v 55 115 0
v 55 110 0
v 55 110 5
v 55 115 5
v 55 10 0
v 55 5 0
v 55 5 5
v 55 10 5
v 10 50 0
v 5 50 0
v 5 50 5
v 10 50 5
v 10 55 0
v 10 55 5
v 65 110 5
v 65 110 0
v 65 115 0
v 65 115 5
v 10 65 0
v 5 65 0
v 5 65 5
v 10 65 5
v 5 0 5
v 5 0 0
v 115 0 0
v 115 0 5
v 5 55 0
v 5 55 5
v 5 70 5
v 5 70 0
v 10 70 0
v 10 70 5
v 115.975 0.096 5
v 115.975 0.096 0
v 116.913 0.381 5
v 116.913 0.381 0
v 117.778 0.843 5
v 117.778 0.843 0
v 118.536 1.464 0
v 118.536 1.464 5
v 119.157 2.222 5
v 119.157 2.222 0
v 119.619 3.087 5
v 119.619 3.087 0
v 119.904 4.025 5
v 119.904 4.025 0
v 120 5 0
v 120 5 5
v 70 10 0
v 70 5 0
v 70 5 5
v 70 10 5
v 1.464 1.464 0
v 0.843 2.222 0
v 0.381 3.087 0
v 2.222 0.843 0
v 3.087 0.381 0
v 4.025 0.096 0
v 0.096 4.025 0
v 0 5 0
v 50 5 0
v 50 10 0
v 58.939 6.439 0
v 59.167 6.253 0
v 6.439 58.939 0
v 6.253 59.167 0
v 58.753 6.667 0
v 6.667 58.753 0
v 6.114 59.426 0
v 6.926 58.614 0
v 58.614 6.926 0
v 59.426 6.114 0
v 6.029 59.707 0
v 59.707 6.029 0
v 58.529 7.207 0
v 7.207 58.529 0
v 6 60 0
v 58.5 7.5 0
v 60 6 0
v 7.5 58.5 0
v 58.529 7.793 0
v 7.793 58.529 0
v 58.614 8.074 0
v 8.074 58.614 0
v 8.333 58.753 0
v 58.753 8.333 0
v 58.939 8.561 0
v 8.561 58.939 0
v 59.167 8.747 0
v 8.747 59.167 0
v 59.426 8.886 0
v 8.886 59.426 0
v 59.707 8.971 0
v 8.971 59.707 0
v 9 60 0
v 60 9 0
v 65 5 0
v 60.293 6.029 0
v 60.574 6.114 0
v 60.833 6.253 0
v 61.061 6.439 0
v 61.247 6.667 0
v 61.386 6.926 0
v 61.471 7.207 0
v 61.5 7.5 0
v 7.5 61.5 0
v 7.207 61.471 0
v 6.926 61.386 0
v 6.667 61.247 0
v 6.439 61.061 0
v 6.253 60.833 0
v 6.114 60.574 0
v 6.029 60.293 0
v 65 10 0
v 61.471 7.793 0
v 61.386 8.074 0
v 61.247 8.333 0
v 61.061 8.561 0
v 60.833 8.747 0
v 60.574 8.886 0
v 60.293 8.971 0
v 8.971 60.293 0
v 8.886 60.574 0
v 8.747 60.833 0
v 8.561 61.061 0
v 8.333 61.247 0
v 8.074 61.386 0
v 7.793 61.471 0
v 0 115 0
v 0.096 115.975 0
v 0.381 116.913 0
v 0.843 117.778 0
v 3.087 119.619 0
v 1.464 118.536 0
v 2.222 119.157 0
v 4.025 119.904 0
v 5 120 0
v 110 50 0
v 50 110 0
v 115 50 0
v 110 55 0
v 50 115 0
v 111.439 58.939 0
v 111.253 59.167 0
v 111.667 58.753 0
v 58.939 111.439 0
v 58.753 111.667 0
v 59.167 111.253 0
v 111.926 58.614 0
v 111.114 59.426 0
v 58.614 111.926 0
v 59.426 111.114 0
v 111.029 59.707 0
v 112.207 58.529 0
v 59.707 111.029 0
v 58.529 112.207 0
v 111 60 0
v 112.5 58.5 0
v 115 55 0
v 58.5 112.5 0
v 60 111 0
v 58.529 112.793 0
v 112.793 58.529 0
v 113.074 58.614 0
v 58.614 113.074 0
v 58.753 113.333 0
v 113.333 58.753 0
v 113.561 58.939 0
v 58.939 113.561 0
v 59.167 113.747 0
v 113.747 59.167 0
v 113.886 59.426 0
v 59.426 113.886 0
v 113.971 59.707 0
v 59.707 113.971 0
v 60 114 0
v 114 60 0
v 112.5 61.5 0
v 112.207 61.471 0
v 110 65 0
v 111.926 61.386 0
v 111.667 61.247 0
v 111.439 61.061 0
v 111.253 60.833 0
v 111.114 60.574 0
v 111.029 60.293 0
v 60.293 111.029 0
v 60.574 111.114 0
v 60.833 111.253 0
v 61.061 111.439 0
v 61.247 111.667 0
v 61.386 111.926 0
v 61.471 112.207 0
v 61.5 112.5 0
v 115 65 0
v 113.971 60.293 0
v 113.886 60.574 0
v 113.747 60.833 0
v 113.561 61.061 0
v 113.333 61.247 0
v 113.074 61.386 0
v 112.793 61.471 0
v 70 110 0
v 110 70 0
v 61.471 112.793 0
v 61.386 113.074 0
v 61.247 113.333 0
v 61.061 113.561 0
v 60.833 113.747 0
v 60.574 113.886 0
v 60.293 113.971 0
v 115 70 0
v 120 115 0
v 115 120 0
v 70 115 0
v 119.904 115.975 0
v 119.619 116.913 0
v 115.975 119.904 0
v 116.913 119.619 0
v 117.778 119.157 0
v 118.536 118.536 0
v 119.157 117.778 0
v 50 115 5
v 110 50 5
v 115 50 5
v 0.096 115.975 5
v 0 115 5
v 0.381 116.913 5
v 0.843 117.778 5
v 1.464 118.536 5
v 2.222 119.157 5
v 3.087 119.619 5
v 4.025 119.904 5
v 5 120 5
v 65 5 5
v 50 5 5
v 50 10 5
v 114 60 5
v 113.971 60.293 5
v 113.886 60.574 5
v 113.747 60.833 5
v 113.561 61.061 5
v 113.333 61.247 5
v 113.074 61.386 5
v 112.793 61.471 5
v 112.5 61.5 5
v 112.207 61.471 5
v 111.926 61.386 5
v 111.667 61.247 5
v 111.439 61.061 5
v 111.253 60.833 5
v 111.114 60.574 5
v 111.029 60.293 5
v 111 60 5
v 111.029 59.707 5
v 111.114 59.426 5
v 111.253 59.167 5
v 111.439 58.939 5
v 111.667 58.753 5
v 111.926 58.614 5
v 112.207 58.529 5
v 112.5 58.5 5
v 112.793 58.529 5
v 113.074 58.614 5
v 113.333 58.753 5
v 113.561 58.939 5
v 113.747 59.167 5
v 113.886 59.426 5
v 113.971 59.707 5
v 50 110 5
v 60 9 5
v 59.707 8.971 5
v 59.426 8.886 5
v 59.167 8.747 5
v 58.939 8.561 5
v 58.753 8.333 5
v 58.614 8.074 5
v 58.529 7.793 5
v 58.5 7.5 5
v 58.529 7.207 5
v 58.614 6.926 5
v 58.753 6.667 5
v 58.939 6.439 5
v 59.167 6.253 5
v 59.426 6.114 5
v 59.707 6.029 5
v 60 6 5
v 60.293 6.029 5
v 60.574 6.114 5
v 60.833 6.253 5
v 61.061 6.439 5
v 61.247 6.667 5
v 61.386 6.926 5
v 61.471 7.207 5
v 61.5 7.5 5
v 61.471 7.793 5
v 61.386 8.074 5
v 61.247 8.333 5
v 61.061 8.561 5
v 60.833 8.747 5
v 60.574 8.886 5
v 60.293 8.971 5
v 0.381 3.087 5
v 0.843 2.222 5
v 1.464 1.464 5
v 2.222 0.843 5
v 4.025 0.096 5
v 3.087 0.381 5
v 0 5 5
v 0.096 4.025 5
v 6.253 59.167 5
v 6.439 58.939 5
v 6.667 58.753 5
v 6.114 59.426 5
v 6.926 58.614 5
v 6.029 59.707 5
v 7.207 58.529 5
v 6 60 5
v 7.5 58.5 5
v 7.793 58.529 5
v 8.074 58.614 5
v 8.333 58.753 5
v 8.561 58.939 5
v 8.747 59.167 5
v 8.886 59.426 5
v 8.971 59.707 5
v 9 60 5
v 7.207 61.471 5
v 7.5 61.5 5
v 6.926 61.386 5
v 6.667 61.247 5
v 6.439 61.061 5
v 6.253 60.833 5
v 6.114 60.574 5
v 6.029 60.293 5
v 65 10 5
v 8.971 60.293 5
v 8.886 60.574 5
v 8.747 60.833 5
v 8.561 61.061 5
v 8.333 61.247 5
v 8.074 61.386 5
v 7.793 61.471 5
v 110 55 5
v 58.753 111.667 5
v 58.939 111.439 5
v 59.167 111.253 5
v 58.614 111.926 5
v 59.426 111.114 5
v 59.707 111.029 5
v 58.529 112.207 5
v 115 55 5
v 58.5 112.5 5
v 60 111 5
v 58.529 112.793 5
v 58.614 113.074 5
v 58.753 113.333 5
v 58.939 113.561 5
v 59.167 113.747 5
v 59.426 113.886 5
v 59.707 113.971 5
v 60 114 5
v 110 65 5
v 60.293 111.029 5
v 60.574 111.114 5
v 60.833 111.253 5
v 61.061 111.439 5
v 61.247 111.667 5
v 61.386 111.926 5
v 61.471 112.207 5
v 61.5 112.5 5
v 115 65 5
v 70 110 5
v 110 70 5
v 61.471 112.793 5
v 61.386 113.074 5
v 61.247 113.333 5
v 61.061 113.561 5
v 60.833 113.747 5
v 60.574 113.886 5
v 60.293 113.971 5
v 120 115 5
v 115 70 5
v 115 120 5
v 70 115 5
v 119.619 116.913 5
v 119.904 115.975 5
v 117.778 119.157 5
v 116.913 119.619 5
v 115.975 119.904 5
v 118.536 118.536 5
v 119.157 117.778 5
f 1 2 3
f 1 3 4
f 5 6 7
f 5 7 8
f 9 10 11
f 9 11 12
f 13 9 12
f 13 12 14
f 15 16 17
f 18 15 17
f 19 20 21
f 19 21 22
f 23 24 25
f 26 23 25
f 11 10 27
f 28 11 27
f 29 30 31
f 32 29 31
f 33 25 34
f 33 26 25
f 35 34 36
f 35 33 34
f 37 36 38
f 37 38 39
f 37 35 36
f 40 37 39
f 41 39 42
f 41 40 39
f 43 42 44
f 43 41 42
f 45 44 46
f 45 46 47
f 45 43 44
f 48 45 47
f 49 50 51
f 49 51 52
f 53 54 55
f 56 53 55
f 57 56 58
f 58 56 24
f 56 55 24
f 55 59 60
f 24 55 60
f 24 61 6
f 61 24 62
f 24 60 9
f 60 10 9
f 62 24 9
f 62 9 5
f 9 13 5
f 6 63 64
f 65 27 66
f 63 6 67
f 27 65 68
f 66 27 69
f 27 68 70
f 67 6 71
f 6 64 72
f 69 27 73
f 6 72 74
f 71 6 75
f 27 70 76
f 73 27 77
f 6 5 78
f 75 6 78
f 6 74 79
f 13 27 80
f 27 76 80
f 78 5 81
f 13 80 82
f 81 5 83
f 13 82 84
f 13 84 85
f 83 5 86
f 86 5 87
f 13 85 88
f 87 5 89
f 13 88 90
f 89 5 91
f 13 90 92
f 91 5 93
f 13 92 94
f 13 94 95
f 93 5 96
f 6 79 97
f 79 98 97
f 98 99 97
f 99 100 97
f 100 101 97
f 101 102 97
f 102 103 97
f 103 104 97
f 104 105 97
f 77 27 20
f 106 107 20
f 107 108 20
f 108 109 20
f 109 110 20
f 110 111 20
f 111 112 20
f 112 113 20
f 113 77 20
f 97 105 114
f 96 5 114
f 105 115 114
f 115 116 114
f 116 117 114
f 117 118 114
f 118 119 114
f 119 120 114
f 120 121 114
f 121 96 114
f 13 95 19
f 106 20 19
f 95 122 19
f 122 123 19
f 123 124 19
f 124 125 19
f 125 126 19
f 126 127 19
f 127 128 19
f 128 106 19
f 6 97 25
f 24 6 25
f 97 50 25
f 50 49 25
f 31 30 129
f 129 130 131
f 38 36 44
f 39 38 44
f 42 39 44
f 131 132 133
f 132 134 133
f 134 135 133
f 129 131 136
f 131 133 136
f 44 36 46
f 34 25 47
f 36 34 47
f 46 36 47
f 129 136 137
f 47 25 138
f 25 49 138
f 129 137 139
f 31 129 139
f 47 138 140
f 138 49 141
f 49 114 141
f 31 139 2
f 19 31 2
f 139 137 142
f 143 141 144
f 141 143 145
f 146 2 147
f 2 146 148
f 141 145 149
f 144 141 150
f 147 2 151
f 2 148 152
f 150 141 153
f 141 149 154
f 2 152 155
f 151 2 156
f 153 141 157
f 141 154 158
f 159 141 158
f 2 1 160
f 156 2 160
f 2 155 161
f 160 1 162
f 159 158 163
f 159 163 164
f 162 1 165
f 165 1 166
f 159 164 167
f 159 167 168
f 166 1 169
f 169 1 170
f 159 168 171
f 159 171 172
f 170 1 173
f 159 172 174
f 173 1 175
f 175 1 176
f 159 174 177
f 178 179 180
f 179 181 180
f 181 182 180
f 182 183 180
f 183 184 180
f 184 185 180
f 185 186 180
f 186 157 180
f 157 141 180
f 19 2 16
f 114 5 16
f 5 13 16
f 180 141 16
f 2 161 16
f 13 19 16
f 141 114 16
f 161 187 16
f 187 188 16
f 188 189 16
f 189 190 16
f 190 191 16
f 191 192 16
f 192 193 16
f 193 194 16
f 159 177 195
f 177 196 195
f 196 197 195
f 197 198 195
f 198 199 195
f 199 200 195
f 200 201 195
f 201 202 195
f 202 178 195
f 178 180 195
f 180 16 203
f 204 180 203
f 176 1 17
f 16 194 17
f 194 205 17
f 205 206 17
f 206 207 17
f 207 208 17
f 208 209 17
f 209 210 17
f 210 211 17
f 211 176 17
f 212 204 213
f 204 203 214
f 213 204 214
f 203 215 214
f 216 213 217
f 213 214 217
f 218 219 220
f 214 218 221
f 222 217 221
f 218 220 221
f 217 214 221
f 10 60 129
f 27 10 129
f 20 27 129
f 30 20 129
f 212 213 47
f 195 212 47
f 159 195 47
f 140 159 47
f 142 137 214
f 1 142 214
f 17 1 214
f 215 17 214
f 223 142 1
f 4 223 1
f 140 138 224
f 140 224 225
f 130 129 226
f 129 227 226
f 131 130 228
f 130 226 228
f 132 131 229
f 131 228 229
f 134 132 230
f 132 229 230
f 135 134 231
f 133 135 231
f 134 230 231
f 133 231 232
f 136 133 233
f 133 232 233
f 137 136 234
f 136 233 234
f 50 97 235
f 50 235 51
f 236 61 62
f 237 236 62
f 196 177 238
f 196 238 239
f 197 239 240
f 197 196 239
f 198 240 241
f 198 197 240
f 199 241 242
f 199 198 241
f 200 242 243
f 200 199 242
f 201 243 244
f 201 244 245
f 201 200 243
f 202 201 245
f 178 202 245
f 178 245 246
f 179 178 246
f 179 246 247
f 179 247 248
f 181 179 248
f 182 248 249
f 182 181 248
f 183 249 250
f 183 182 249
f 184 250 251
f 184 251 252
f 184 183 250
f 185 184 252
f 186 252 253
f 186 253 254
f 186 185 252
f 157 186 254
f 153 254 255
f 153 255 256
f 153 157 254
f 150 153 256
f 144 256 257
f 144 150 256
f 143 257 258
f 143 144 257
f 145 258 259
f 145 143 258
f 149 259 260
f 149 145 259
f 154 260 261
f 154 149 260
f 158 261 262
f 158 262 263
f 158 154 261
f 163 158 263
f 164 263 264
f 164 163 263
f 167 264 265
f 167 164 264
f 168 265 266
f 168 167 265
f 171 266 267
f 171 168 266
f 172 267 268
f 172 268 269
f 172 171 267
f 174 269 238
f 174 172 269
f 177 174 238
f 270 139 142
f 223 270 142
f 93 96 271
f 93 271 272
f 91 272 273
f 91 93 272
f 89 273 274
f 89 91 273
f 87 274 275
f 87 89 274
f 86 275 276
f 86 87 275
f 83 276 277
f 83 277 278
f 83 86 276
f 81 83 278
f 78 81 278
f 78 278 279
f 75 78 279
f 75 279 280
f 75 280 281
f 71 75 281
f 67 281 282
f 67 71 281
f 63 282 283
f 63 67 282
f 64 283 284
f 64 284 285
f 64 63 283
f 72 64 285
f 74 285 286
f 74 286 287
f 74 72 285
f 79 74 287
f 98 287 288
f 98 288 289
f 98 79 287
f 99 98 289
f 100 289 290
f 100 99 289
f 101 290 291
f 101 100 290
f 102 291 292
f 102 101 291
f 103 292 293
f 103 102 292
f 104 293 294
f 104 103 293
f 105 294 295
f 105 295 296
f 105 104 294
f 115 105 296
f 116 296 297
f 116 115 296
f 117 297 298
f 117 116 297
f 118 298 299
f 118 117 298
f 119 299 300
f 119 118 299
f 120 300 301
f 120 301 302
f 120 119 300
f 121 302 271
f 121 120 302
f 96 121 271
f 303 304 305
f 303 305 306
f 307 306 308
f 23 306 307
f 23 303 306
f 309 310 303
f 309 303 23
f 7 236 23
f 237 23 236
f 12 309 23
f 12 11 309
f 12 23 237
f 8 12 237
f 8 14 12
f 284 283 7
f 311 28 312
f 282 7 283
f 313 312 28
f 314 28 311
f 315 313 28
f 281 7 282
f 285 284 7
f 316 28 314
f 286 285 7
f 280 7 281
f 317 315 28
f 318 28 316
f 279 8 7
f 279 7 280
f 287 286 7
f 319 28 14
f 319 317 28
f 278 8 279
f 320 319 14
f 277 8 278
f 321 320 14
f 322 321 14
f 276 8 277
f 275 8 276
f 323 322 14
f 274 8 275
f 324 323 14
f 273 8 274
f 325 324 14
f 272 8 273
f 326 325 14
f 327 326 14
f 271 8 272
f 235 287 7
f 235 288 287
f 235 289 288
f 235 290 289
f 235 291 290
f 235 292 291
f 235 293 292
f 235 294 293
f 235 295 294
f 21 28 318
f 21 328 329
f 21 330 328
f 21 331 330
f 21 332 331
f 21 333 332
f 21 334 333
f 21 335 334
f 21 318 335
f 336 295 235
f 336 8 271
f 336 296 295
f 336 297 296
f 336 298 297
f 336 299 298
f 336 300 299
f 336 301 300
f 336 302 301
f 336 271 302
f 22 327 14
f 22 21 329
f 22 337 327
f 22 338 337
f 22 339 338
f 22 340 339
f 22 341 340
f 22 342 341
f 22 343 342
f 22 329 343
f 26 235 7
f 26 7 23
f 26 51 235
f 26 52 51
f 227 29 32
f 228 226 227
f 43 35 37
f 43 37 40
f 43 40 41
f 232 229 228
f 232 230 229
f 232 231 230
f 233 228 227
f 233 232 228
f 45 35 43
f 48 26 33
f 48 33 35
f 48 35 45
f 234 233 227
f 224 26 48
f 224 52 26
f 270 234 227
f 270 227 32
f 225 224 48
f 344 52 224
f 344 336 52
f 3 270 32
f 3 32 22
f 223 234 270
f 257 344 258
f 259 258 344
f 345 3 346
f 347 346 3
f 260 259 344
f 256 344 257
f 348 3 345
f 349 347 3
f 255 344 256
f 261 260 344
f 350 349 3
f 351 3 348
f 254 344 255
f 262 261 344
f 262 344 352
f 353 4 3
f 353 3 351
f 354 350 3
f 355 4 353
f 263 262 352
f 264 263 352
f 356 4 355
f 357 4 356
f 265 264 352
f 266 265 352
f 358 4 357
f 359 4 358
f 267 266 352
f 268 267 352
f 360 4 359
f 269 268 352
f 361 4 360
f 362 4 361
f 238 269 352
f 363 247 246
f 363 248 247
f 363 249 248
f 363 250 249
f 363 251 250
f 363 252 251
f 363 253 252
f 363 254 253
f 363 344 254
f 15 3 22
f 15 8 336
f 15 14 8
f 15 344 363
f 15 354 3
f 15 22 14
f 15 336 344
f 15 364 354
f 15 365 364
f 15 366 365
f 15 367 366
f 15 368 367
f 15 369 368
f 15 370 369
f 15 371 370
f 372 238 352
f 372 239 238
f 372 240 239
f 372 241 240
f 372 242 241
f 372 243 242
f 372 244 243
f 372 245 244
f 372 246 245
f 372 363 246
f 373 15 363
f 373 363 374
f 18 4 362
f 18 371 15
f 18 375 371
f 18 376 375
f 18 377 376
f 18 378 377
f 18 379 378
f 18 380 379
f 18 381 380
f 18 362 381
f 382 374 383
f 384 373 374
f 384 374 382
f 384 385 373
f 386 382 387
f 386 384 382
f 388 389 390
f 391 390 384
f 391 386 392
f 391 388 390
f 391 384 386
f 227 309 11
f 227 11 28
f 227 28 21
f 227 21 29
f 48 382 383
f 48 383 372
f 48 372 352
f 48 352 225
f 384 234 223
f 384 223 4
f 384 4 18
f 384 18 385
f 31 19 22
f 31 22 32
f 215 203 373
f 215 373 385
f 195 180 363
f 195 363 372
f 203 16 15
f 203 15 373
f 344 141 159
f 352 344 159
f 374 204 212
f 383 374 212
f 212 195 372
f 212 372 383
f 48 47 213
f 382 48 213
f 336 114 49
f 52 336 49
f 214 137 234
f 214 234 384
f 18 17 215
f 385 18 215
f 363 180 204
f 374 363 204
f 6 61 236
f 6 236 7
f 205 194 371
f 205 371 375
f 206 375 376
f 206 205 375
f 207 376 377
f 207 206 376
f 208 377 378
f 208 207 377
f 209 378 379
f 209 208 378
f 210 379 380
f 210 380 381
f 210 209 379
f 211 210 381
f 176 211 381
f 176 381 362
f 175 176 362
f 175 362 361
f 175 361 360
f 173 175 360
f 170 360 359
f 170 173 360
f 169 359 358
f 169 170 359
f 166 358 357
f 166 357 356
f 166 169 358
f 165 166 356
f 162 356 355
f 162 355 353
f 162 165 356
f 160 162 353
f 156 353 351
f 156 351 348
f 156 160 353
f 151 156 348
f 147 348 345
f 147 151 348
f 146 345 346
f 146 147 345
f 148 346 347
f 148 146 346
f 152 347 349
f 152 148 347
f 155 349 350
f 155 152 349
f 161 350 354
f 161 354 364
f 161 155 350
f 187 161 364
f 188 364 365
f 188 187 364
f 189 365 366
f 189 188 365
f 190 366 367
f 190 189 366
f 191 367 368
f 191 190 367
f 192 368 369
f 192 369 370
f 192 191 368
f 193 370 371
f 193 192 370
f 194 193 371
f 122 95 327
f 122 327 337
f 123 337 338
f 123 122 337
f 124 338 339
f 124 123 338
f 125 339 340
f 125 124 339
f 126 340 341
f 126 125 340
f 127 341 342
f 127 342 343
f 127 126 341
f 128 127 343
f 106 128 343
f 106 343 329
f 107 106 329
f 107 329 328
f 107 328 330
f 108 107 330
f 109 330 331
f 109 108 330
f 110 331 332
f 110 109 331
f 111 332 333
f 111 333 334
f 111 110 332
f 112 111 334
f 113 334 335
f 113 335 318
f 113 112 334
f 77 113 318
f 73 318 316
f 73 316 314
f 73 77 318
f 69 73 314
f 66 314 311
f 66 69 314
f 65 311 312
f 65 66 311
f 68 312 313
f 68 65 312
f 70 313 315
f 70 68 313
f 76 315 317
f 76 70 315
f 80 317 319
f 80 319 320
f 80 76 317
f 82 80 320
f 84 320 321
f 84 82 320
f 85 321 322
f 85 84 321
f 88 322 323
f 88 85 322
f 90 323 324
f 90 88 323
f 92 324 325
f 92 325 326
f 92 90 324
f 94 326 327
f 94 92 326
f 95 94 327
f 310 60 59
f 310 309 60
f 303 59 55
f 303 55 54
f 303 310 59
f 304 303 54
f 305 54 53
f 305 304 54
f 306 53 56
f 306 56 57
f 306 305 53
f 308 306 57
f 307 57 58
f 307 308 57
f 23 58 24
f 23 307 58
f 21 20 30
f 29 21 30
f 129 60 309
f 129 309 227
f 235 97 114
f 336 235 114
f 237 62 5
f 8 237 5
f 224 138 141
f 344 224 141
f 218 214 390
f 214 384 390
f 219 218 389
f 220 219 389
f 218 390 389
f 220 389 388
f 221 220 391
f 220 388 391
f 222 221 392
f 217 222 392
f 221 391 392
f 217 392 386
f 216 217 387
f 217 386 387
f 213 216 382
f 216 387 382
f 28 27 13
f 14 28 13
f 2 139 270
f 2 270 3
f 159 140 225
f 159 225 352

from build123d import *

# Parameters (mm, degrees)
SKETCH1_W           = 120
SKETCH1_H           = 120
SKETCH1_R           = 1.5
SKETCH1_W_2         = 5
SKETCH1_H_2         = 5
BOSS_EXTRUDE1_DEPTH = 5
FILLET1_R           = 5


with BuildPart() as part:
    # Sketch1 → Boss-Extrude1 (new body)
    with BuildSketch(Plane.XY):
        with Locations((60, 60)):
            Rectangle(SKETCH1_W, SKETCH1_H)
        with Locations((112.5, 60)):
            Circle(SKETCH1_R, mode=Mode.SUBTRACT)
        with Locations((7.5, 60)):
            Circle(SKETCH1_R, mode=Mode.SUBTRACT)
        with Locations((60, 112.5)):
            Circle(SKETCH1_R, mode=Mode.SUBTRACT)
        with Locations(Location((60, 7.5, 0), (0, 0, 90))):
            Circle(SKETCH1_R, mode=Mode.SUBTRACT)
        with Locations((112.5, 52.5)):
            Rectangle(SKETCH1_W_2, SKETCH1_H_2, mode=Mode.SUBTRACT)
        with Locations((112.5, 67.5)):
            Rectangle(SKETCH1_W_2, SKETCH1_H_2, mode=Mode.SUBTRACT)
        with Locations((7.5, 52.5)):
            Rectangle(SKETCH1_W_2, SKETCH1_H_2, mode=Mode.SUBTRACT)
        with Locations((7.5, 67.5)):
            Rectangle(SKETCH1_W_2, SKETCH1_H_2, mode=Mode.SUBTRACT)
        with Locations((67.5, 112.5)):
            Rectangle(SKETCH1_W_2, SKETCH1_H_2, mode=Mode.SUBTRACT)
        with Locations((52.5, 112.5)):
            Rectangle(SKETCH1_W_2, SKETCH1_H_2, mode=Mode.SUBTRACT)
        with Locations((67.5, 7.5)):
            Rectangle(SKETCH1_W_2, SKETCH1_H_2, mode=Mode.SUBTRACT)
        with Locations((52.5, 7.5)):
            Rectangle(SKETCH1_W_2, SKETCH1_H_2, mode=Mode.SUBTRACT)
    extrude(amount=BOSS_EXTRUDE1_DEPTH)

    # Fillet1
    fillet1_edges = [part.edges().sort_by_distance(p)[0] for p in [
        (0, 120, 2.5),
        (120, 120, 2.5),
        (120, 0, 2.5),
        (0, 0, 2.5),
    ]]
    fillet(fillet1_edges, radius=FILLET1_R)


solid = part.part
